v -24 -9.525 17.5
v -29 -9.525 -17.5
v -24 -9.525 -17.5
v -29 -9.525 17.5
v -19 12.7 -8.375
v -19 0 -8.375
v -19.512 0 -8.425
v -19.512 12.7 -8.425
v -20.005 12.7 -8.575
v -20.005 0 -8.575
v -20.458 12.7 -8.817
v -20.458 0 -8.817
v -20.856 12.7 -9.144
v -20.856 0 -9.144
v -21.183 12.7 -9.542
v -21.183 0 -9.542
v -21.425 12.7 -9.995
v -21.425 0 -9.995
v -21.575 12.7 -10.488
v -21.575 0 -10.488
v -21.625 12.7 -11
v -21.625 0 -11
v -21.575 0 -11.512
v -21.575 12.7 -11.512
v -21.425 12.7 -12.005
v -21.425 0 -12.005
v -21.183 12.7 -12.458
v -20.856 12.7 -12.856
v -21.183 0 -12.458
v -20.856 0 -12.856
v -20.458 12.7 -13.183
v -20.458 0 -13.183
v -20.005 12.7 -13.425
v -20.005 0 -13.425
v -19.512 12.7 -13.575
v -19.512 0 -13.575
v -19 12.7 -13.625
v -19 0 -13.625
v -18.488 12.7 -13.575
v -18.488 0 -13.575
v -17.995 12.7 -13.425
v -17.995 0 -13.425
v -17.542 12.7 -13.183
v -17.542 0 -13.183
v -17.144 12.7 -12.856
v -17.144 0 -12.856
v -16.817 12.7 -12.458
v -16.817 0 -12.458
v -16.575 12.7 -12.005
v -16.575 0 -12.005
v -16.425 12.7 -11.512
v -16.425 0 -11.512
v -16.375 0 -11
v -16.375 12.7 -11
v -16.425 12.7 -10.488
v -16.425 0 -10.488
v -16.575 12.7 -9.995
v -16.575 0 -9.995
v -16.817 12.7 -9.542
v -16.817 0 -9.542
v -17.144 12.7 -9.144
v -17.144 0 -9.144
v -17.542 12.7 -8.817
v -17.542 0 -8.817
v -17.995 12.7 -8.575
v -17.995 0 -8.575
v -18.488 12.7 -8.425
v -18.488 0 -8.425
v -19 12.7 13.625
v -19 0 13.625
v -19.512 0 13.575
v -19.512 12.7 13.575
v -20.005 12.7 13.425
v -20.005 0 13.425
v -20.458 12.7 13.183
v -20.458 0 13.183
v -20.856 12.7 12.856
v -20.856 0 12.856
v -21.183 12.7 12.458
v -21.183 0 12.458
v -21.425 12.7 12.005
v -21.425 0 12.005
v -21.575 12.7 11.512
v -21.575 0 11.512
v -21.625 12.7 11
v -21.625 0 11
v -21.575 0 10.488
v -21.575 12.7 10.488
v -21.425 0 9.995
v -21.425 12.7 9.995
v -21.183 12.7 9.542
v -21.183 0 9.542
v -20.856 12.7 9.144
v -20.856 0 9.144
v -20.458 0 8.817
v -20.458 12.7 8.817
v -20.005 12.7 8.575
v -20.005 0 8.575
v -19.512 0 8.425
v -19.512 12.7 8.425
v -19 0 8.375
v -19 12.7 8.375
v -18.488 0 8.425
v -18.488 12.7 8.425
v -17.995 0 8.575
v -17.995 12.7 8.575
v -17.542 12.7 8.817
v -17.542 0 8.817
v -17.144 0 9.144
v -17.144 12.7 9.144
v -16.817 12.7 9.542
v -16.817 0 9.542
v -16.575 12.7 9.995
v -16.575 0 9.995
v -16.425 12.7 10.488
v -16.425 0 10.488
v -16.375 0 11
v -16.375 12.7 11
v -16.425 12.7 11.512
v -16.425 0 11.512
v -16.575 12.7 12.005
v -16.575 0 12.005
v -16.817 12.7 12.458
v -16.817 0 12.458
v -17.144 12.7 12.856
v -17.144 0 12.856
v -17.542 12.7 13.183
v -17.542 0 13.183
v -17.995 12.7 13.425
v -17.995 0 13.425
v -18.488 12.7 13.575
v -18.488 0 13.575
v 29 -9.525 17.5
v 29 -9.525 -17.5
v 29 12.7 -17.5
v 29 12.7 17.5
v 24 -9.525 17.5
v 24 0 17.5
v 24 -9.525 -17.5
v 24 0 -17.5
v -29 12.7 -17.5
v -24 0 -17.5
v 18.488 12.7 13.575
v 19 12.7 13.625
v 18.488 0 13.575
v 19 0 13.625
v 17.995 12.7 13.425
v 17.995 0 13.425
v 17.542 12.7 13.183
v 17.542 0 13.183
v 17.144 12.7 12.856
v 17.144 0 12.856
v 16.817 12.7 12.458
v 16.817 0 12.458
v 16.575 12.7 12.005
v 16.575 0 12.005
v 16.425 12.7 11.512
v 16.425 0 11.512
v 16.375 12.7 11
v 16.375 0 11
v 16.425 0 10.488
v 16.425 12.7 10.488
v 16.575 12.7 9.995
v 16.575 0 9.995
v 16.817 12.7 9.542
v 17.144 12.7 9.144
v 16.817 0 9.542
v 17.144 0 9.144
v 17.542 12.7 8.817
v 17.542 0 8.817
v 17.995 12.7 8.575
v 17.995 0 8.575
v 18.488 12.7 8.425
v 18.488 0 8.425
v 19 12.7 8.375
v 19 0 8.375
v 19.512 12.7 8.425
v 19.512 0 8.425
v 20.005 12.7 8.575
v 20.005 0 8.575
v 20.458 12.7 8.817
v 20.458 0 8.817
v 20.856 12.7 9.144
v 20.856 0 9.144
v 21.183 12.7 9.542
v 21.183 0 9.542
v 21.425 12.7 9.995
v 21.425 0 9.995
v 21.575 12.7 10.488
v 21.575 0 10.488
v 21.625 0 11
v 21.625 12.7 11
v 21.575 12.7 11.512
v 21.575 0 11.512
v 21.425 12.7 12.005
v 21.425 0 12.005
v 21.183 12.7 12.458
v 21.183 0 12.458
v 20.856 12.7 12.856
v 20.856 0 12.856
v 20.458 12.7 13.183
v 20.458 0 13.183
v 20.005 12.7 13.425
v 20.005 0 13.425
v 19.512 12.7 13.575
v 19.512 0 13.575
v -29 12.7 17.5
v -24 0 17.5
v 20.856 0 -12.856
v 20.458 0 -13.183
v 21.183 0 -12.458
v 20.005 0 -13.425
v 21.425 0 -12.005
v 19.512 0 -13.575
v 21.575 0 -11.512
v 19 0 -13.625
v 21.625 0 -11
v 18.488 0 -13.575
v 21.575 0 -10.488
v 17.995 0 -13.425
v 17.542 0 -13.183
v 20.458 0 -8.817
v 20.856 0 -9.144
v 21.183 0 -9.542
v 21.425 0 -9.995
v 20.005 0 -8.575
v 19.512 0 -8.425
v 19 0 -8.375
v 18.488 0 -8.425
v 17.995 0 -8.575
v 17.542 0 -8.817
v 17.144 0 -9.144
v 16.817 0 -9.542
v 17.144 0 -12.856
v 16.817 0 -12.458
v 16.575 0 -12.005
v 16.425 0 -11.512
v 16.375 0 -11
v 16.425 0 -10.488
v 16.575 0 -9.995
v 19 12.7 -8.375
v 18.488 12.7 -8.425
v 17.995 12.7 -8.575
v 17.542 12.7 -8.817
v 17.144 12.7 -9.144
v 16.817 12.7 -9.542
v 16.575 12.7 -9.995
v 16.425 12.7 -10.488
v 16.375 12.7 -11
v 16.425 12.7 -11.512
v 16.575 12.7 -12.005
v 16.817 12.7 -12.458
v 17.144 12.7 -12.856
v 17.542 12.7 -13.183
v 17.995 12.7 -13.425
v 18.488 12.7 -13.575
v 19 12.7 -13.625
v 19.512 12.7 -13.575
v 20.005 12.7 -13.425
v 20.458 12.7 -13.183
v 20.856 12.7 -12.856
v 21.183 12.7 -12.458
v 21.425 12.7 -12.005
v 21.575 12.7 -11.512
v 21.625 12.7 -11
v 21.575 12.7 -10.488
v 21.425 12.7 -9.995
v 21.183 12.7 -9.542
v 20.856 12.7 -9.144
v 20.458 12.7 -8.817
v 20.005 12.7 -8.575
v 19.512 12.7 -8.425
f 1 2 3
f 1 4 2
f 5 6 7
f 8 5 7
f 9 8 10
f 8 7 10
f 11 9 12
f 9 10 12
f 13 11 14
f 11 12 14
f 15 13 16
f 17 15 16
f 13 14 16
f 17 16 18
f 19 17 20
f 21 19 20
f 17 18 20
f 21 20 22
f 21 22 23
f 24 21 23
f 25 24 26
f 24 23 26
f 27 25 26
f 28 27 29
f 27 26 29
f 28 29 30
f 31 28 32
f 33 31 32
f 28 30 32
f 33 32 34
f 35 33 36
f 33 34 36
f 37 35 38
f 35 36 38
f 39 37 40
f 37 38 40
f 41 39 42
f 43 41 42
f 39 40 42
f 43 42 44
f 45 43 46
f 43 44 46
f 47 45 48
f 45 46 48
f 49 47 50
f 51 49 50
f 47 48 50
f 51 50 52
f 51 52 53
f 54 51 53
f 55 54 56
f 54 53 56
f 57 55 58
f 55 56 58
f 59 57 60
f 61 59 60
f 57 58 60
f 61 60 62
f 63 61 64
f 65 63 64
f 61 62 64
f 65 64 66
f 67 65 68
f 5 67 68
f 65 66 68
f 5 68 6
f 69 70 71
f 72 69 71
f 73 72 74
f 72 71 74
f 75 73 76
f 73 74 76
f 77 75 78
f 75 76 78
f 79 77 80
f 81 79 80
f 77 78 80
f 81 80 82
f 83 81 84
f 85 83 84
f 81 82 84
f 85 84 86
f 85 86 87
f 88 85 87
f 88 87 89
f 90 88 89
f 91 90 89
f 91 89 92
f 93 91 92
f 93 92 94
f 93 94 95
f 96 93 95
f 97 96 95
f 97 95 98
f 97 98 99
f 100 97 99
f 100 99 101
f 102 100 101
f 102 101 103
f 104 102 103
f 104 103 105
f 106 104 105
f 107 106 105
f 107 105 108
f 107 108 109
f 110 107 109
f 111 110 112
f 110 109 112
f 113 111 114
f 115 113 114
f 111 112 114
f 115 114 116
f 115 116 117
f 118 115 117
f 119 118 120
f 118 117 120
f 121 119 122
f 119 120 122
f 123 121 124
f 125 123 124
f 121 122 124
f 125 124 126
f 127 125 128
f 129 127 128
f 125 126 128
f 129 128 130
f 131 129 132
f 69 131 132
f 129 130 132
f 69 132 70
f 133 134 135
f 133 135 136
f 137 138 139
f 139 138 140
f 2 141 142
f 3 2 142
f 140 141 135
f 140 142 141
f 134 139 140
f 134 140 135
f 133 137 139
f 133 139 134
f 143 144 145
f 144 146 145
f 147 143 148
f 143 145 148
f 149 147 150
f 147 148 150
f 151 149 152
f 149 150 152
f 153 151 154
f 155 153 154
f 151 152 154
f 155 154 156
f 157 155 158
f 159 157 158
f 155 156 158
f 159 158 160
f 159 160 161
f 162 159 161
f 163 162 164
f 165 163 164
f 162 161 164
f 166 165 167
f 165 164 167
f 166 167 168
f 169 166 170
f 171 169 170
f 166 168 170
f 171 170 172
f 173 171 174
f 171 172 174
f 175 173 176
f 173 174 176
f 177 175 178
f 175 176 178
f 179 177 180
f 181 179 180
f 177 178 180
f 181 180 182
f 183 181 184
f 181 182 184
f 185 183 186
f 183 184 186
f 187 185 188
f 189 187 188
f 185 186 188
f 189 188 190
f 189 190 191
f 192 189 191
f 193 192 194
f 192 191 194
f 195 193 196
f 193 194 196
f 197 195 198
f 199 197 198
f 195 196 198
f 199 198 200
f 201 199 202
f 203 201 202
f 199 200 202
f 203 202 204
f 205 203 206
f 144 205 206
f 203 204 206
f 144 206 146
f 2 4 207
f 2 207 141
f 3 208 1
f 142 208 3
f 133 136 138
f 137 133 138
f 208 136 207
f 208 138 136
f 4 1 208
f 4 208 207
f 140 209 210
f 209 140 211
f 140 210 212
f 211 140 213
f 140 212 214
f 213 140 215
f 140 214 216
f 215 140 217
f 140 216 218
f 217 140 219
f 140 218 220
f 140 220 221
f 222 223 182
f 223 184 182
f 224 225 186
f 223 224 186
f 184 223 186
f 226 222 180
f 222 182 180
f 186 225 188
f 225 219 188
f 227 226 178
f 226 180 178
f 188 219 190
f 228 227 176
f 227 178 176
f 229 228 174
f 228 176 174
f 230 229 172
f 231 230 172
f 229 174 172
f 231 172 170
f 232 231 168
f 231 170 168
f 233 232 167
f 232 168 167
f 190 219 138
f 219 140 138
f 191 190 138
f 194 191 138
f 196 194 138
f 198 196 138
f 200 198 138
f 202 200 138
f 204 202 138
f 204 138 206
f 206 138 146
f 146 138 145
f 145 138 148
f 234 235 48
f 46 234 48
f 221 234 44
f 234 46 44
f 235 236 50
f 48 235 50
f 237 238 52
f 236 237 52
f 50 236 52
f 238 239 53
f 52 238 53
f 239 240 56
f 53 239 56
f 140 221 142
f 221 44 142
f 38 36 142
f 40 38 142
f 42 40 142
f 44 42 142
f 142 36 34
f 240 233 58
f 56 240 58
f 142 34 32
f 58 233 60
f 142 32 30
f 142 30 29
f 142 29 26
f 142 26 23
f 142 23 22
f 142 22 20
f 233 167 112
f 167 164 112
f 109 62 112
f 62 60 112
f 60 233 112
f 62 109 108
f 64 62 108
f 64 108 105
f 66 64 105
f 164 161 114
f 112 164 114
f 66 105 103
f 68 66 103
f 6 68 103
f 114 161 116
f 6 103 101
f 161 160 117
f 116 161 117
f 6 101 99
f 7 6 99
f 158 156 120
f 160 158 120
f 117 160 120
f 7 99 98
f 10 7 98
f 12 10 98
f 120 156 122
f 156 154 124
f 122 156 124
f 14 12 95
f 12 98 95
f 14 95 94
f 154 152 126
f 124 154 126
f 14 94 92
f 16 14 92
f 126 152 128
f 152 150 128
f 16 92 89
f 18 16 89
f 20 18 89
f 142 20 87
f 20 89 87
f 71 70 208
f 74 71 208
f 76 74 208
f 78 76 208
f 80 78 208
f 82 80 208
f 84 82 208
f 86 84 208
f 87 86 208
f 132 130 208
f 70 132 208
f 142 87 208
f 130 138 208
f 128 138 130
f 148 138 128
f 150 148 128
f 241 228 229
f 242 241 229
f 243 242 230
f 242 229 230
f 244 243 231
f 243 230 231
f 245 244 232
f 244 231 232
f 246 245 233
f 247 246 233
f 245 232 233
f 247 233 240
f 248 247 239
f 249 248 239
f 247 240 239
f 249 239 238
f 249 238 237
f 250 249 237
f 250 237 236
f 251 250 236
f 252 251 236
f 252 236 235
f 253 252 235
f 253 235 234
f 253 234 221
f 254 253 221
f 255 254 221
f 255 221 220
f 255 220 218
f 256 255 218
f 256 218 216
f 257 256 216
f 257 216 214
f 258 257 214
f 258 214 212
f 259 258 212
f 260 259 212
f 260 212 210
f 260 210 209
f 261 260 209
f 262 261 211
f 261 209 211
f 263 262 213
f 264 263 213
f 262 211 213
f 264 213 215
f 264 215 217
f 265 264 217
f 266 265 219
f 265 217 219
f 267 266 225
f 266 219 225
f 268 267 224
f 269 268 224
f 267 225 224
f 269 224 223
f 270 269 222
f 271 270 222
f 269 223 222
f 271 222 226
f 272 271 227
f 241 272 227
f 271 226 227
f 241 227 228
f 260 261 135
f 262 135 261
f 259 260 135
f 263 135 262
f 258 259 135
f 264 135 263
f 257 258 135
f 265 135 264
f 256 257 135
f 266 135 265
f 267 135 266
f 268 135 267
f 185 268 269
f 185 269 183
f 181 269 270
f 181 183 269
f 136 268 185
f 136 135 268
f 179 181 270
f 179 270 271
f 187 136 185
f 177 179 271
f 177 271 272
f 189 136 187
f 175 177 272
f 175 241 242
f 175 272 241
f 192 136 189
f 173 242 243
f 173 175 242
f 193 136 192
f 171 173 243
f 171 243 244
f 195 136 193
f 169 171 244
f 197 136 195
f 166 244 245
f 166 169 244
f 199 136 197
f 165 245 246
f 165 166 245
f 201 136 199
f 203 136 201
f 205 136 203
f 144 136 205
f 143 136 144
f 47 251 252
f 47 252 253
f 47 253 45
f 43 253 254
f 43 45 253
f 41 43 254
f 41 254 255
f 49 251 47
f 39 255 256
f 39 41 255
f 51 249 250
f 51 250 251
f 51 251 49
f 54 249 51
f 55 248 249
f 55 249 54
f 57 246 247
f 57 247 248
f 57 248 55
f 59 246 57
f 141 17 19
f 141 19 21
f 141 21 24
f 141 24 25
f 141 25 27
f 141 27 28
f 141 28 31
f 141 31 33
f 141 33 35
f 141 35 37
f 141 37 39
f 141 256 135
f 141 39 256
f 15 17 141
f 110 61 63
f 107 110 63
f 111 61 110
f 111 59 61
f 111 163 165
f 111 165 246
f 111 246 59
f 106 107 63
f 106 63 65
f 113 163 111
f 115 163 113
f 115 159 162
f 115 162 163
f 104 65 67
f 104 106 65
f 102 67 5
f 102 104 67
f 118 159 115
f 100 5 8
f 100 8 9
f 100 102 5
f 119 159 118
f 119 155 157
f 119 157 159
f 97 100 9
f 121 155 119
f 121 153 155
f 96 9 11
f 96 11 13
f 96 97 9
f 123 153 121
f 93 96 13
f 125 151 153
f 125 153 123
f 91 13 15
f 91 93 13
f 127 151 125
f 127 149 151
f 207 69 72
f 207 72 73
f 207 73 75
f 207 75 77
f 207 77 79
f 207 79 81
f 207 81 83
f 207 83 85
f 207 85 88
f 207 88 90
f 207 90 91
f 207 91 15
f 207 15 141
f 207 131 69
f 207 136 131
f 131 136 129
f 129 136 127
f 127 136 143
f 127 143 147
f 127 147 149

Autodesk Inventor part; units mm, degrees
ref_plane "YZ Plane" through (0, 0, 0) normal (1, 0, 0) x (0, 1, 0)
ref_plane "XZ Plane" through (0, 0, 0) normal (0, 1, 0) x (-1, 0, 0)
ref_plane "XY Plane" through (0, 0, 0) normal (0, 0, 1) x (1, 0, 0)
sketch "Sketch1" plane through (0, 0, 0) normal (0, 1, 0) x (-1, 0, 0)
  line L0 (29, -17.5) -> (-29, -17.5)
  line L1 (-29, -17.5) -> (-29, 17.5)
  line L2 (-29, 17.5) -> (29, 17.5)
  line L3 (29, 17.5) -> (29, -17.5)
  line L4 (29, -17.5) -> (-29, 17.5) construction
  line L5 (-29, -17.5) -> (29, 17.5) construction
  point P0 (0, 0)
  dimension "d0" = 58
  dimension "d1" = 35
extrude "Extrusion1" add sketch "Sketch1" along normal blind 12.7
sketch "Sketch2" plane through (0, 0, 0) normal (0, -1, 0) x (1, 0, 0)
  line L0 (-29, -17.5) -> (29, -17.5) projected
  line L1 (29, -17.5) -> (29, 17.5) projected
  line L2 (29, 17.5) -> (-29, 17.5) projected
  line L3 (-29, 17.5) -> (-29, -17.5) projected
  line L4 (-24, 17.5) -> (-24, -17.5)
  line L5 (24, 17.5) -> (24, -17.5)
  point P0 (0, 0)
  dimension "d4" = 5
  dimension "d5" = 5
extrude "Extrusion2" add sketch "Sketch2" along normal blind 9.525 contours L3 L2 L4 L0 | L5 L2 L1 L0
sketch "Sketch3" plane through (0, 12.7, 0) normal (0, 1, 0) x (1, 0, 0)
  line L0 (29, 17.5) -> (-29, 17.5) projected
  line L1 (-29, 17.5) -> (-29, -17.5) projected
  point P0 (0, 0)
  point P1 (-19, 11)
  point P2 (19, 11)
  point P3 (-19, -11)
  point P4 (19, -11)
  dimension "d10" = 38
  dimension "d13" = 22
  dimension "d16" = 10
  dimension "d17" = 58
  dimension "d18" = 35
  dimension "d19" = 6.5
hole "Hole1" at (-19, 12.7, -11) at (19, 12.7, -11) at (-19, 12.7, 11) at (19, 12.7, 11) direction (0, -1, 0) diameter 5.25 end through all
equation "\"d5\" = d4"
equation "\"d16\" = -0.5 * d10 + 0.5 * d17"
equation "\"d19\" = -0.5 * d13 + 0.5 * d18"
properties part number "hd16_standoff"
